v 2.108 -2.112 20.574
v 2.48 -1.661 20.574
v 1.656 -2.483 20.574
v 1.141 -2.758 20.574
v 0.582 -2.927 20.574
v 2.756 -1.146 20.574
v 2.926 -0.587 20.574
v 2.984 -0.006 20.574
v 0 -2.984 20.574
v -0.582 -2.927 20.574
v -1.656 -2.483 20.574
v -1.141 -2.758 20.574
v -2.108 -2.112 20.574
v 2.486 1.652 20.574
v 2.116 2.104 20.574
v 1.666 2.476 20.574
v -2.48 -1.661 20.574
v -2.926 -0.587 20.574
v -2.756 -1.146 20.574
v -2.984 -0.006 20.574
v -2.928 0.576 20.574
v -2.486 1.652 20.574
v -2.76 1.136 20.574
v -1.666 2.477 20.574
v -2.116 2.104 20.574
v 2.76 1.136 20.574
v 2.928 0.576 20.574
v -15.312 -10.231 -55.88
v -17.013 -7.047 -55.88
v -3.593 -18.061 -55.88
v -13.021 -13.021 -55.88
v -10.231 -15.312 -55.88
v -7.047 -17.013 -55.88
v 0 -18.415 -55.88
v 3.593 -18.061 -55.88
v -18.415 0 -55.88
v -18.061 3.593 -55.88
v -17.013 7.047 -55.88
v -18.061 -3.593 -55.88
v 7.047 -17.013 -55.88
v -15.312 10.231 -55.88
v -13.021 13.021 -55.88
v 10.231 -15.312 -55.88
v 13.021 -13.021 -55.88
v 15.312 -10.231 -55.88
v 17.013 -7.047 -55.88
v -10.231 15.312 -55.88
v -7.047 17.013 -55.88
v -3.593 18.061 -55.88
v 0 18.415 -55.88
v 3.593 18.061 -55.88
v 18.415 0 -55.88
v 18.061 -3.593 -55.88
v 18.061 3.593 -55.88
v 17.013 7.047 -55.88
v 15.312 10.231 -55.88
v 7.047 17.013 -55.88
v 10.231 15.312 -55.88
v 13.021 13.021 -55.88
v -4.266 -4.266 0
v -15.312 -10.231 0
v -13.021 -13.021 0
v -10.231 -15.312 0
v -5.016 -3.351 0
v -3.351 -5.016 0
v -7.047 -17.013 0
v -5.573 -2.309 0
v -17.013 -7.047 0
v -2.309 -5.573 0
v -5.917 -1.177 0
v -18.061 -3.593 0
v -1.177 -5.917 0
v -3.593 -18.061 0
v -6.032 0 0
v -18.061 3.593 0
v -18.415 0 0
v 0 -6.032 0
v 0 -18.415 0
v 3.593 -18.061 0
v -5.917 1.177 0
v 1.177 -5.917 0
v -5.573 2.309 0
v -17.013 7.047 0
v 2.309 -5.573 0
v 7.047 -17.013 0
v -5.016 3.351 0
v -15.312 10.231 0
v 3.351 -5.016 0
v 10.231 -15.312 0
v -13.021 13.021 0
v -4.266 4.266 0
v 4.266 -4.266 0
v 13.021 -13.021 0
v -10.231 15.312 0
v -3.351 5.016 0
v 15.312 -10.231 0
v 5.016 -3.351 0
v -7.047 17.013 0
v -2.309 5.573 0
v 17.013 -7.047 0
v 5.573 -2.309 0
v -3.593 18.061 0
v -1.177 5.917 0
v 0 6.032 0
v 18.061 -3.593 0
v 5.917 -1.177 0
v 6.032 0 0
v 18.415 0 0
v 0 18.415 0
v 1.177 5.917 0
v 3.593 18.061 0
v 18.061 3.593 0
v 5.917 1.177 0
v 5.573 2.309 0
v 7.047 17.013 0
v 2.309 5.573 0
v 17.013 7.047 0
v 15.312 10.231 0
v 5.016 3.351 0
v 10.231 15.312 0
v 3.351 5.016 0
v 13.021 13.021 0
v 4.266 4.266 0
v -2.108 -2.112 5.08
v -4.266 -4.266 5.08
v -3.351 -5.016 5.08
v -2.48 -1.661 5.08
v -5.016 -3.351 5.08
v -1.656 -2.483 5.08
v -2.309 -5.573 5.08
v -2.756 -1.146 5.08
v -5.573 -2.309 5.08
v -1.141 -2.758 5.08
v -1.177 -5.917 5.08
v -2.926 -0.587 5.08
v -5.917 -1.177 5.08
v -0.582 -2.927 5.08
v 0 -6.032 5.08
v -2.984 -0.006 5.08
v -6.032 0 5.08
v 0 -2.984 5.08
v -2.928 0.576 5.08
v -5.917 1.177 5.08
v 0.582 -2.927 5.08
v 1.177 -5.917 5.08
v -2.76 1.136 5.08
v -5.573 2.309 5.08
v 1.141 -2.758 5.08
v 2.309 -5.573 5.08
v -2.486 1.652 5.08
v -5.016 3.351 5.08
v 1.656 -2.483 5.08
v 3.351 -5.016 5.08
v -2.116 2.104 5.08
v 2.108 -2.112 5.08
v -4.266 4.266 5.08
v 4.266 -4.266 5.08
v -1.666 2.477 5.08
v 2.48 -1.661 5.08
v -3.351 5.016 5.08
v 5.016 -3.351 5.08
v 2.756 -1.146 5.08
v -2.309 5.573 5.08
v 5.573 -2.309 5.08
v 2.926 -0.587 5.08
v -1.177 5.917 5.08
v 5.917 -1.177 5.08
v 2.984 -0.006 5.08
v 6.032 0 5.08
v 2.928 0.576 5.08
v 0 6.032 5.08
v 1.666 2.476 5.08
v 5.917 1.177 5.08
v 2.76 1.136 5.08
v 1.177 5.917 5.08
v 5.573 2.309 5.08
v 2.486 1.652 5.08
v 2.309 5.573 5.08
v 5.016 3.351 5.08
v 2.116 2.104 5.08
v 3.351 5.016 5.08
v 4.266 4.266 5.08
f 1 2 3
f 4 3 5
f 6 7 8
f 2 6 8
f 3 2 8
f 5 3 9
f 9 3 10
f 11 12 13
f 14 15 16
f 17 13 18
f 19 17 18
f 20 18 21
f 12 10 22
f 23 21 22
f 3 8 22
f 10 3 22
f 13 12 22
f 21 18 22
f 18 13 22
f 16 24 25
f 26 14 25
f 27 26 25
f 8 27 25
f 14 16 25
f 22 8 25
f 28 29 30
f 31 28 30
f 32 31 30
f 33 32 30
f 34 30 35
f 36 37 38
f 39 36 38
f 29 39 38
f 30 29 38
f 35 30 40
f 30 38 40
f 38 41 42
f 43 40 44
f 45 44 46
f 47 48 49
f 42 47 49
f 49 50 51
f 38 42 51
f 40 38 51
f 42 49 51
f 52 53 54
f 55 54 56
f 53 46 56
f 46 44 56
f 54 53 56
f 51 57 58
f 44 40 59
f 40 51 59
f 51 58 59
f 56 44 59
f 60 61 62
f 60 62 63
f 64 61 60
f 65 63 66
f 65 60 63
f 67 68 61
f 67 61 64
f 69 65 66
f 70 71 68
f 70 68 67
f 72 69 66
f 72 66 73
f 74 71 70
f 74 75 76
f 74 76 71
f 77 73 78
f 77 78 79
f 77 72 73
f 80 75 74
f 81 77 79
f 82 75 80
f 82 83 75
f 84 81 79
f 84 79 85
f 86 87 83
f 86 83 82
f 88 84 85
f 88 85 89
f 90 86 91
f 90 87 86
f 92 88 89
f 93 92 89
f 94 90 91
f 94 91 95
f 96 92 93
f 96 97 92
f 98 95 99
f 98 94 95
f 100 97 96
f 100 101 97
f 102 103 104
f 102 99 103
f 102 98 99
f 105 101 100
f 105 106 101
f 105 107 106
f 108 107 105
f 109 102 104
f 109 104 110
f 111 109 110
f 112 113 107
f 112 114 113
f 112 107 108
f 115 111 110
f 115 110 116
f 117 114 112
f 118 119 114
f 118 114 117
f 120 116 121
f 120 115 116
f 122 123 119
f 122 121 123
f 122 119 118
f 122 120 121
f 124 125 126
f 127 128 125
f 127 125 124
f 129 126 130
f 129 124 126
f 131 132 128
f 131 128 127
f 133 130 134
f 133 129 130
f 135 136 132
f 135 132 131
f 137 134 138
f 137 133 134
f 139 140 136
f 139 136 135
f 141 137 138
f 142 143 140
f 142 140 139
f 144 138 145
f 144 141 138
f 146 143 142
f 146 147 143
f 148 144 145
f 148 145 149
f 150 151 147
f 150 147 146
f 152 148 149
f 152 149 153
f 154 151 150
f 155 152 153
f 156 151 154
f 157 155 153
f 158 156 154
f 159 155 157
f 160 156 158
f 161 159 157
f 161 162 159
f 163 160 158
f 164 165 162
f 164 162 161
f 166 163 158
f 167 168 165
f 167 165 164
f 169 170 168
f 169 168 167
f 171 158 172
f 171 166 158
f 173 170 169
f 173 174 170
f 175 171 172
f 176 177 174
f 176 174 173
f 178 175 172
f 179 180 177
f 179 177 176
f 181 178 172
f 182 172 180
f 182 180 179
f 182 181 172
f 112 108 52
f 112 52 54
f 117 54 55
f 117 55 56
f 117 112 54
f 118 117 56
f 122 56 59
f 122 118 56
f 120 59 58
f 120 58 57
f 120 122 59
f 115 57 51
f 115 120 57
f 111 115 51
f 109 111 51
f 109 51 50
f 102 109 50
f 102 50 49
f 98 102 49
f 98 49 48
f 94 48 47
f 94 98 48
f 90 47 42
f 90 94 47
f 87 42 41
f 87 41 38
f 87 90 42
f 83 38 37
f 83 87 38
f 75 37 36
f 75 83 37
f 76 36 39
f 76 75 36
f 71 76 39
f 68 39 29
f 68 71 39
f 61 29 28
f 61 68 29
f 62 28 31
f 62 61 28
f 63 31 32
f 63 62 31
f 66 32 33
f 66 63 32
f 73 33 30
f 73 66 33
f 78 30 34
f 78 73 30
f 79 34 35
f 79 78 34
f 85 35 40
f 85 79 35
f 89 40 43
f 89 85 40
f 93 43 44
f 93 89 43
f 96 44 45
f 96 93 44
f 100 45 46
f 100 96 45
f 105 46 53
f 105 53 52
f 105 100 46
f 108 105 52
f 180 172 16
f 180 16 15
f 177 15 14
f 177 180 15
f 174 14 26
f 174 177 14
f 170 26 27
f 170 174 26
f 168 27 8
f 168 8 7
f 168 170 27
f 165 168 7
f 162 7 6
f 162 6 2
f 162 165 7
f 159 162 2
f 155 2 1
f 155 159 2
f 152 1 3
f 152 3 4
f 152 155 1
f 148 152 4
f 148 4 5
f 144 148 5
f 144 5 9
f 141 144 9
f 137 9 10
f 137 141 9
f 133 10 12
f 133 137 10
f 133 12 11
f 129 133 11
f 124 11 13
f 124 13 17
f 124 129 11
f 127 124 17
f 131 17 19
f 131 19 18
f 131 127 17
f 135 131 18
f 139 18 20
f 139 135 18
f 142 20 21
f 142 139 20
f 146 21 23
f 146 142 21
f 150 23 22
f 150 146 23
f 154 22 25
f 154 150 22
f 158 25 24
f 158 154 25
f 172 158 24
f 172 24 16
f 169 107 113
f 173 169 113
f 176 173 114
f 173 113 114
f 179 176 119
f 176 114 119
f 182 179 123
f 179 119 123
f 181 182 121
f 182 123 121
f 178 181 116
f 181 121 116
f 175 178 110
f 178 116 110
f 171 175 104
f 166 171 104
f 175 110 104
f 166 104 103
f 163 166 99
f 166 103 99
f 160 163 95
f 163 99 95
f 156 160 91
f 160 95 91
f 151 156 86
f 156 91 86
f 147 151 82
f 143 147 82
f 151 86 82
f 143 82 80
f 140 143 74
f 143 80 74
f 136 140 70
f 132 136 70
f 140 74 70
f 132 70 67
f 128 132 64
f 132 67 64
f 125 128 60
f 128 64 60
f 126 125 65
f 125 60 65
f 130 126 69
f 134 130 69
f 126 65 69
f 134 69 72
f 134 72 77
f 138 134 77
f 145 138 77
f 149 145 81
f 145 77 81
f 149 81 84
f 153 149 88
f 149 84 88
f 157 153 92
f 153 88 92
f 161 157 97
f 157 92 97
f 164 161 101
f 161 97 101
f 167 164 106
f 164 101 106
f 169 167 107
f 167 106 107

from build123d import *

# Parameters (mm, degrees)
SKETCH1_R           = 18.415
BOSS_EXTRUDE1_DEPTH = 55.88
SKETCH1_3_R         = 6.0325
BOSS_EXTRUDE2_DEPTH = 5.08
BOSS_EXTRUDE3_DEPTH = 15.494


with BuildPart() as part:
    # Sketch1 → Boss-Extrude1 (new body)
    with BuildSketch(Plane.XY):
        Circle(SKETCH1_R)
    extrude(amount=-BOSS_EXTRUDE1_DEPTH)

    # Sketch1<3> → Boss-Extrude2 (add)
    with BuildSketch(Plane.XY):
        Circle(SKETCH1_3_R)
    extrude(amount=BOSS_EXTRUDE2_DEPTH)

    # Sketch3 → Boss-Extrude3 (add)
    with BuildSketch(Plane.XY.offset(5.08)):
        with BuildLine():
            Line((-1.665589385, 2.4765), (1.665589385, 2.4765))
            ThreePointArc((1.665589385, 2.4765), (0, -2.9845), (-1.665589385, 2.4765))
        make_face()
    extrude(amount=BOSS_EXTRUDE3_DEPTH)


solid = part.part
